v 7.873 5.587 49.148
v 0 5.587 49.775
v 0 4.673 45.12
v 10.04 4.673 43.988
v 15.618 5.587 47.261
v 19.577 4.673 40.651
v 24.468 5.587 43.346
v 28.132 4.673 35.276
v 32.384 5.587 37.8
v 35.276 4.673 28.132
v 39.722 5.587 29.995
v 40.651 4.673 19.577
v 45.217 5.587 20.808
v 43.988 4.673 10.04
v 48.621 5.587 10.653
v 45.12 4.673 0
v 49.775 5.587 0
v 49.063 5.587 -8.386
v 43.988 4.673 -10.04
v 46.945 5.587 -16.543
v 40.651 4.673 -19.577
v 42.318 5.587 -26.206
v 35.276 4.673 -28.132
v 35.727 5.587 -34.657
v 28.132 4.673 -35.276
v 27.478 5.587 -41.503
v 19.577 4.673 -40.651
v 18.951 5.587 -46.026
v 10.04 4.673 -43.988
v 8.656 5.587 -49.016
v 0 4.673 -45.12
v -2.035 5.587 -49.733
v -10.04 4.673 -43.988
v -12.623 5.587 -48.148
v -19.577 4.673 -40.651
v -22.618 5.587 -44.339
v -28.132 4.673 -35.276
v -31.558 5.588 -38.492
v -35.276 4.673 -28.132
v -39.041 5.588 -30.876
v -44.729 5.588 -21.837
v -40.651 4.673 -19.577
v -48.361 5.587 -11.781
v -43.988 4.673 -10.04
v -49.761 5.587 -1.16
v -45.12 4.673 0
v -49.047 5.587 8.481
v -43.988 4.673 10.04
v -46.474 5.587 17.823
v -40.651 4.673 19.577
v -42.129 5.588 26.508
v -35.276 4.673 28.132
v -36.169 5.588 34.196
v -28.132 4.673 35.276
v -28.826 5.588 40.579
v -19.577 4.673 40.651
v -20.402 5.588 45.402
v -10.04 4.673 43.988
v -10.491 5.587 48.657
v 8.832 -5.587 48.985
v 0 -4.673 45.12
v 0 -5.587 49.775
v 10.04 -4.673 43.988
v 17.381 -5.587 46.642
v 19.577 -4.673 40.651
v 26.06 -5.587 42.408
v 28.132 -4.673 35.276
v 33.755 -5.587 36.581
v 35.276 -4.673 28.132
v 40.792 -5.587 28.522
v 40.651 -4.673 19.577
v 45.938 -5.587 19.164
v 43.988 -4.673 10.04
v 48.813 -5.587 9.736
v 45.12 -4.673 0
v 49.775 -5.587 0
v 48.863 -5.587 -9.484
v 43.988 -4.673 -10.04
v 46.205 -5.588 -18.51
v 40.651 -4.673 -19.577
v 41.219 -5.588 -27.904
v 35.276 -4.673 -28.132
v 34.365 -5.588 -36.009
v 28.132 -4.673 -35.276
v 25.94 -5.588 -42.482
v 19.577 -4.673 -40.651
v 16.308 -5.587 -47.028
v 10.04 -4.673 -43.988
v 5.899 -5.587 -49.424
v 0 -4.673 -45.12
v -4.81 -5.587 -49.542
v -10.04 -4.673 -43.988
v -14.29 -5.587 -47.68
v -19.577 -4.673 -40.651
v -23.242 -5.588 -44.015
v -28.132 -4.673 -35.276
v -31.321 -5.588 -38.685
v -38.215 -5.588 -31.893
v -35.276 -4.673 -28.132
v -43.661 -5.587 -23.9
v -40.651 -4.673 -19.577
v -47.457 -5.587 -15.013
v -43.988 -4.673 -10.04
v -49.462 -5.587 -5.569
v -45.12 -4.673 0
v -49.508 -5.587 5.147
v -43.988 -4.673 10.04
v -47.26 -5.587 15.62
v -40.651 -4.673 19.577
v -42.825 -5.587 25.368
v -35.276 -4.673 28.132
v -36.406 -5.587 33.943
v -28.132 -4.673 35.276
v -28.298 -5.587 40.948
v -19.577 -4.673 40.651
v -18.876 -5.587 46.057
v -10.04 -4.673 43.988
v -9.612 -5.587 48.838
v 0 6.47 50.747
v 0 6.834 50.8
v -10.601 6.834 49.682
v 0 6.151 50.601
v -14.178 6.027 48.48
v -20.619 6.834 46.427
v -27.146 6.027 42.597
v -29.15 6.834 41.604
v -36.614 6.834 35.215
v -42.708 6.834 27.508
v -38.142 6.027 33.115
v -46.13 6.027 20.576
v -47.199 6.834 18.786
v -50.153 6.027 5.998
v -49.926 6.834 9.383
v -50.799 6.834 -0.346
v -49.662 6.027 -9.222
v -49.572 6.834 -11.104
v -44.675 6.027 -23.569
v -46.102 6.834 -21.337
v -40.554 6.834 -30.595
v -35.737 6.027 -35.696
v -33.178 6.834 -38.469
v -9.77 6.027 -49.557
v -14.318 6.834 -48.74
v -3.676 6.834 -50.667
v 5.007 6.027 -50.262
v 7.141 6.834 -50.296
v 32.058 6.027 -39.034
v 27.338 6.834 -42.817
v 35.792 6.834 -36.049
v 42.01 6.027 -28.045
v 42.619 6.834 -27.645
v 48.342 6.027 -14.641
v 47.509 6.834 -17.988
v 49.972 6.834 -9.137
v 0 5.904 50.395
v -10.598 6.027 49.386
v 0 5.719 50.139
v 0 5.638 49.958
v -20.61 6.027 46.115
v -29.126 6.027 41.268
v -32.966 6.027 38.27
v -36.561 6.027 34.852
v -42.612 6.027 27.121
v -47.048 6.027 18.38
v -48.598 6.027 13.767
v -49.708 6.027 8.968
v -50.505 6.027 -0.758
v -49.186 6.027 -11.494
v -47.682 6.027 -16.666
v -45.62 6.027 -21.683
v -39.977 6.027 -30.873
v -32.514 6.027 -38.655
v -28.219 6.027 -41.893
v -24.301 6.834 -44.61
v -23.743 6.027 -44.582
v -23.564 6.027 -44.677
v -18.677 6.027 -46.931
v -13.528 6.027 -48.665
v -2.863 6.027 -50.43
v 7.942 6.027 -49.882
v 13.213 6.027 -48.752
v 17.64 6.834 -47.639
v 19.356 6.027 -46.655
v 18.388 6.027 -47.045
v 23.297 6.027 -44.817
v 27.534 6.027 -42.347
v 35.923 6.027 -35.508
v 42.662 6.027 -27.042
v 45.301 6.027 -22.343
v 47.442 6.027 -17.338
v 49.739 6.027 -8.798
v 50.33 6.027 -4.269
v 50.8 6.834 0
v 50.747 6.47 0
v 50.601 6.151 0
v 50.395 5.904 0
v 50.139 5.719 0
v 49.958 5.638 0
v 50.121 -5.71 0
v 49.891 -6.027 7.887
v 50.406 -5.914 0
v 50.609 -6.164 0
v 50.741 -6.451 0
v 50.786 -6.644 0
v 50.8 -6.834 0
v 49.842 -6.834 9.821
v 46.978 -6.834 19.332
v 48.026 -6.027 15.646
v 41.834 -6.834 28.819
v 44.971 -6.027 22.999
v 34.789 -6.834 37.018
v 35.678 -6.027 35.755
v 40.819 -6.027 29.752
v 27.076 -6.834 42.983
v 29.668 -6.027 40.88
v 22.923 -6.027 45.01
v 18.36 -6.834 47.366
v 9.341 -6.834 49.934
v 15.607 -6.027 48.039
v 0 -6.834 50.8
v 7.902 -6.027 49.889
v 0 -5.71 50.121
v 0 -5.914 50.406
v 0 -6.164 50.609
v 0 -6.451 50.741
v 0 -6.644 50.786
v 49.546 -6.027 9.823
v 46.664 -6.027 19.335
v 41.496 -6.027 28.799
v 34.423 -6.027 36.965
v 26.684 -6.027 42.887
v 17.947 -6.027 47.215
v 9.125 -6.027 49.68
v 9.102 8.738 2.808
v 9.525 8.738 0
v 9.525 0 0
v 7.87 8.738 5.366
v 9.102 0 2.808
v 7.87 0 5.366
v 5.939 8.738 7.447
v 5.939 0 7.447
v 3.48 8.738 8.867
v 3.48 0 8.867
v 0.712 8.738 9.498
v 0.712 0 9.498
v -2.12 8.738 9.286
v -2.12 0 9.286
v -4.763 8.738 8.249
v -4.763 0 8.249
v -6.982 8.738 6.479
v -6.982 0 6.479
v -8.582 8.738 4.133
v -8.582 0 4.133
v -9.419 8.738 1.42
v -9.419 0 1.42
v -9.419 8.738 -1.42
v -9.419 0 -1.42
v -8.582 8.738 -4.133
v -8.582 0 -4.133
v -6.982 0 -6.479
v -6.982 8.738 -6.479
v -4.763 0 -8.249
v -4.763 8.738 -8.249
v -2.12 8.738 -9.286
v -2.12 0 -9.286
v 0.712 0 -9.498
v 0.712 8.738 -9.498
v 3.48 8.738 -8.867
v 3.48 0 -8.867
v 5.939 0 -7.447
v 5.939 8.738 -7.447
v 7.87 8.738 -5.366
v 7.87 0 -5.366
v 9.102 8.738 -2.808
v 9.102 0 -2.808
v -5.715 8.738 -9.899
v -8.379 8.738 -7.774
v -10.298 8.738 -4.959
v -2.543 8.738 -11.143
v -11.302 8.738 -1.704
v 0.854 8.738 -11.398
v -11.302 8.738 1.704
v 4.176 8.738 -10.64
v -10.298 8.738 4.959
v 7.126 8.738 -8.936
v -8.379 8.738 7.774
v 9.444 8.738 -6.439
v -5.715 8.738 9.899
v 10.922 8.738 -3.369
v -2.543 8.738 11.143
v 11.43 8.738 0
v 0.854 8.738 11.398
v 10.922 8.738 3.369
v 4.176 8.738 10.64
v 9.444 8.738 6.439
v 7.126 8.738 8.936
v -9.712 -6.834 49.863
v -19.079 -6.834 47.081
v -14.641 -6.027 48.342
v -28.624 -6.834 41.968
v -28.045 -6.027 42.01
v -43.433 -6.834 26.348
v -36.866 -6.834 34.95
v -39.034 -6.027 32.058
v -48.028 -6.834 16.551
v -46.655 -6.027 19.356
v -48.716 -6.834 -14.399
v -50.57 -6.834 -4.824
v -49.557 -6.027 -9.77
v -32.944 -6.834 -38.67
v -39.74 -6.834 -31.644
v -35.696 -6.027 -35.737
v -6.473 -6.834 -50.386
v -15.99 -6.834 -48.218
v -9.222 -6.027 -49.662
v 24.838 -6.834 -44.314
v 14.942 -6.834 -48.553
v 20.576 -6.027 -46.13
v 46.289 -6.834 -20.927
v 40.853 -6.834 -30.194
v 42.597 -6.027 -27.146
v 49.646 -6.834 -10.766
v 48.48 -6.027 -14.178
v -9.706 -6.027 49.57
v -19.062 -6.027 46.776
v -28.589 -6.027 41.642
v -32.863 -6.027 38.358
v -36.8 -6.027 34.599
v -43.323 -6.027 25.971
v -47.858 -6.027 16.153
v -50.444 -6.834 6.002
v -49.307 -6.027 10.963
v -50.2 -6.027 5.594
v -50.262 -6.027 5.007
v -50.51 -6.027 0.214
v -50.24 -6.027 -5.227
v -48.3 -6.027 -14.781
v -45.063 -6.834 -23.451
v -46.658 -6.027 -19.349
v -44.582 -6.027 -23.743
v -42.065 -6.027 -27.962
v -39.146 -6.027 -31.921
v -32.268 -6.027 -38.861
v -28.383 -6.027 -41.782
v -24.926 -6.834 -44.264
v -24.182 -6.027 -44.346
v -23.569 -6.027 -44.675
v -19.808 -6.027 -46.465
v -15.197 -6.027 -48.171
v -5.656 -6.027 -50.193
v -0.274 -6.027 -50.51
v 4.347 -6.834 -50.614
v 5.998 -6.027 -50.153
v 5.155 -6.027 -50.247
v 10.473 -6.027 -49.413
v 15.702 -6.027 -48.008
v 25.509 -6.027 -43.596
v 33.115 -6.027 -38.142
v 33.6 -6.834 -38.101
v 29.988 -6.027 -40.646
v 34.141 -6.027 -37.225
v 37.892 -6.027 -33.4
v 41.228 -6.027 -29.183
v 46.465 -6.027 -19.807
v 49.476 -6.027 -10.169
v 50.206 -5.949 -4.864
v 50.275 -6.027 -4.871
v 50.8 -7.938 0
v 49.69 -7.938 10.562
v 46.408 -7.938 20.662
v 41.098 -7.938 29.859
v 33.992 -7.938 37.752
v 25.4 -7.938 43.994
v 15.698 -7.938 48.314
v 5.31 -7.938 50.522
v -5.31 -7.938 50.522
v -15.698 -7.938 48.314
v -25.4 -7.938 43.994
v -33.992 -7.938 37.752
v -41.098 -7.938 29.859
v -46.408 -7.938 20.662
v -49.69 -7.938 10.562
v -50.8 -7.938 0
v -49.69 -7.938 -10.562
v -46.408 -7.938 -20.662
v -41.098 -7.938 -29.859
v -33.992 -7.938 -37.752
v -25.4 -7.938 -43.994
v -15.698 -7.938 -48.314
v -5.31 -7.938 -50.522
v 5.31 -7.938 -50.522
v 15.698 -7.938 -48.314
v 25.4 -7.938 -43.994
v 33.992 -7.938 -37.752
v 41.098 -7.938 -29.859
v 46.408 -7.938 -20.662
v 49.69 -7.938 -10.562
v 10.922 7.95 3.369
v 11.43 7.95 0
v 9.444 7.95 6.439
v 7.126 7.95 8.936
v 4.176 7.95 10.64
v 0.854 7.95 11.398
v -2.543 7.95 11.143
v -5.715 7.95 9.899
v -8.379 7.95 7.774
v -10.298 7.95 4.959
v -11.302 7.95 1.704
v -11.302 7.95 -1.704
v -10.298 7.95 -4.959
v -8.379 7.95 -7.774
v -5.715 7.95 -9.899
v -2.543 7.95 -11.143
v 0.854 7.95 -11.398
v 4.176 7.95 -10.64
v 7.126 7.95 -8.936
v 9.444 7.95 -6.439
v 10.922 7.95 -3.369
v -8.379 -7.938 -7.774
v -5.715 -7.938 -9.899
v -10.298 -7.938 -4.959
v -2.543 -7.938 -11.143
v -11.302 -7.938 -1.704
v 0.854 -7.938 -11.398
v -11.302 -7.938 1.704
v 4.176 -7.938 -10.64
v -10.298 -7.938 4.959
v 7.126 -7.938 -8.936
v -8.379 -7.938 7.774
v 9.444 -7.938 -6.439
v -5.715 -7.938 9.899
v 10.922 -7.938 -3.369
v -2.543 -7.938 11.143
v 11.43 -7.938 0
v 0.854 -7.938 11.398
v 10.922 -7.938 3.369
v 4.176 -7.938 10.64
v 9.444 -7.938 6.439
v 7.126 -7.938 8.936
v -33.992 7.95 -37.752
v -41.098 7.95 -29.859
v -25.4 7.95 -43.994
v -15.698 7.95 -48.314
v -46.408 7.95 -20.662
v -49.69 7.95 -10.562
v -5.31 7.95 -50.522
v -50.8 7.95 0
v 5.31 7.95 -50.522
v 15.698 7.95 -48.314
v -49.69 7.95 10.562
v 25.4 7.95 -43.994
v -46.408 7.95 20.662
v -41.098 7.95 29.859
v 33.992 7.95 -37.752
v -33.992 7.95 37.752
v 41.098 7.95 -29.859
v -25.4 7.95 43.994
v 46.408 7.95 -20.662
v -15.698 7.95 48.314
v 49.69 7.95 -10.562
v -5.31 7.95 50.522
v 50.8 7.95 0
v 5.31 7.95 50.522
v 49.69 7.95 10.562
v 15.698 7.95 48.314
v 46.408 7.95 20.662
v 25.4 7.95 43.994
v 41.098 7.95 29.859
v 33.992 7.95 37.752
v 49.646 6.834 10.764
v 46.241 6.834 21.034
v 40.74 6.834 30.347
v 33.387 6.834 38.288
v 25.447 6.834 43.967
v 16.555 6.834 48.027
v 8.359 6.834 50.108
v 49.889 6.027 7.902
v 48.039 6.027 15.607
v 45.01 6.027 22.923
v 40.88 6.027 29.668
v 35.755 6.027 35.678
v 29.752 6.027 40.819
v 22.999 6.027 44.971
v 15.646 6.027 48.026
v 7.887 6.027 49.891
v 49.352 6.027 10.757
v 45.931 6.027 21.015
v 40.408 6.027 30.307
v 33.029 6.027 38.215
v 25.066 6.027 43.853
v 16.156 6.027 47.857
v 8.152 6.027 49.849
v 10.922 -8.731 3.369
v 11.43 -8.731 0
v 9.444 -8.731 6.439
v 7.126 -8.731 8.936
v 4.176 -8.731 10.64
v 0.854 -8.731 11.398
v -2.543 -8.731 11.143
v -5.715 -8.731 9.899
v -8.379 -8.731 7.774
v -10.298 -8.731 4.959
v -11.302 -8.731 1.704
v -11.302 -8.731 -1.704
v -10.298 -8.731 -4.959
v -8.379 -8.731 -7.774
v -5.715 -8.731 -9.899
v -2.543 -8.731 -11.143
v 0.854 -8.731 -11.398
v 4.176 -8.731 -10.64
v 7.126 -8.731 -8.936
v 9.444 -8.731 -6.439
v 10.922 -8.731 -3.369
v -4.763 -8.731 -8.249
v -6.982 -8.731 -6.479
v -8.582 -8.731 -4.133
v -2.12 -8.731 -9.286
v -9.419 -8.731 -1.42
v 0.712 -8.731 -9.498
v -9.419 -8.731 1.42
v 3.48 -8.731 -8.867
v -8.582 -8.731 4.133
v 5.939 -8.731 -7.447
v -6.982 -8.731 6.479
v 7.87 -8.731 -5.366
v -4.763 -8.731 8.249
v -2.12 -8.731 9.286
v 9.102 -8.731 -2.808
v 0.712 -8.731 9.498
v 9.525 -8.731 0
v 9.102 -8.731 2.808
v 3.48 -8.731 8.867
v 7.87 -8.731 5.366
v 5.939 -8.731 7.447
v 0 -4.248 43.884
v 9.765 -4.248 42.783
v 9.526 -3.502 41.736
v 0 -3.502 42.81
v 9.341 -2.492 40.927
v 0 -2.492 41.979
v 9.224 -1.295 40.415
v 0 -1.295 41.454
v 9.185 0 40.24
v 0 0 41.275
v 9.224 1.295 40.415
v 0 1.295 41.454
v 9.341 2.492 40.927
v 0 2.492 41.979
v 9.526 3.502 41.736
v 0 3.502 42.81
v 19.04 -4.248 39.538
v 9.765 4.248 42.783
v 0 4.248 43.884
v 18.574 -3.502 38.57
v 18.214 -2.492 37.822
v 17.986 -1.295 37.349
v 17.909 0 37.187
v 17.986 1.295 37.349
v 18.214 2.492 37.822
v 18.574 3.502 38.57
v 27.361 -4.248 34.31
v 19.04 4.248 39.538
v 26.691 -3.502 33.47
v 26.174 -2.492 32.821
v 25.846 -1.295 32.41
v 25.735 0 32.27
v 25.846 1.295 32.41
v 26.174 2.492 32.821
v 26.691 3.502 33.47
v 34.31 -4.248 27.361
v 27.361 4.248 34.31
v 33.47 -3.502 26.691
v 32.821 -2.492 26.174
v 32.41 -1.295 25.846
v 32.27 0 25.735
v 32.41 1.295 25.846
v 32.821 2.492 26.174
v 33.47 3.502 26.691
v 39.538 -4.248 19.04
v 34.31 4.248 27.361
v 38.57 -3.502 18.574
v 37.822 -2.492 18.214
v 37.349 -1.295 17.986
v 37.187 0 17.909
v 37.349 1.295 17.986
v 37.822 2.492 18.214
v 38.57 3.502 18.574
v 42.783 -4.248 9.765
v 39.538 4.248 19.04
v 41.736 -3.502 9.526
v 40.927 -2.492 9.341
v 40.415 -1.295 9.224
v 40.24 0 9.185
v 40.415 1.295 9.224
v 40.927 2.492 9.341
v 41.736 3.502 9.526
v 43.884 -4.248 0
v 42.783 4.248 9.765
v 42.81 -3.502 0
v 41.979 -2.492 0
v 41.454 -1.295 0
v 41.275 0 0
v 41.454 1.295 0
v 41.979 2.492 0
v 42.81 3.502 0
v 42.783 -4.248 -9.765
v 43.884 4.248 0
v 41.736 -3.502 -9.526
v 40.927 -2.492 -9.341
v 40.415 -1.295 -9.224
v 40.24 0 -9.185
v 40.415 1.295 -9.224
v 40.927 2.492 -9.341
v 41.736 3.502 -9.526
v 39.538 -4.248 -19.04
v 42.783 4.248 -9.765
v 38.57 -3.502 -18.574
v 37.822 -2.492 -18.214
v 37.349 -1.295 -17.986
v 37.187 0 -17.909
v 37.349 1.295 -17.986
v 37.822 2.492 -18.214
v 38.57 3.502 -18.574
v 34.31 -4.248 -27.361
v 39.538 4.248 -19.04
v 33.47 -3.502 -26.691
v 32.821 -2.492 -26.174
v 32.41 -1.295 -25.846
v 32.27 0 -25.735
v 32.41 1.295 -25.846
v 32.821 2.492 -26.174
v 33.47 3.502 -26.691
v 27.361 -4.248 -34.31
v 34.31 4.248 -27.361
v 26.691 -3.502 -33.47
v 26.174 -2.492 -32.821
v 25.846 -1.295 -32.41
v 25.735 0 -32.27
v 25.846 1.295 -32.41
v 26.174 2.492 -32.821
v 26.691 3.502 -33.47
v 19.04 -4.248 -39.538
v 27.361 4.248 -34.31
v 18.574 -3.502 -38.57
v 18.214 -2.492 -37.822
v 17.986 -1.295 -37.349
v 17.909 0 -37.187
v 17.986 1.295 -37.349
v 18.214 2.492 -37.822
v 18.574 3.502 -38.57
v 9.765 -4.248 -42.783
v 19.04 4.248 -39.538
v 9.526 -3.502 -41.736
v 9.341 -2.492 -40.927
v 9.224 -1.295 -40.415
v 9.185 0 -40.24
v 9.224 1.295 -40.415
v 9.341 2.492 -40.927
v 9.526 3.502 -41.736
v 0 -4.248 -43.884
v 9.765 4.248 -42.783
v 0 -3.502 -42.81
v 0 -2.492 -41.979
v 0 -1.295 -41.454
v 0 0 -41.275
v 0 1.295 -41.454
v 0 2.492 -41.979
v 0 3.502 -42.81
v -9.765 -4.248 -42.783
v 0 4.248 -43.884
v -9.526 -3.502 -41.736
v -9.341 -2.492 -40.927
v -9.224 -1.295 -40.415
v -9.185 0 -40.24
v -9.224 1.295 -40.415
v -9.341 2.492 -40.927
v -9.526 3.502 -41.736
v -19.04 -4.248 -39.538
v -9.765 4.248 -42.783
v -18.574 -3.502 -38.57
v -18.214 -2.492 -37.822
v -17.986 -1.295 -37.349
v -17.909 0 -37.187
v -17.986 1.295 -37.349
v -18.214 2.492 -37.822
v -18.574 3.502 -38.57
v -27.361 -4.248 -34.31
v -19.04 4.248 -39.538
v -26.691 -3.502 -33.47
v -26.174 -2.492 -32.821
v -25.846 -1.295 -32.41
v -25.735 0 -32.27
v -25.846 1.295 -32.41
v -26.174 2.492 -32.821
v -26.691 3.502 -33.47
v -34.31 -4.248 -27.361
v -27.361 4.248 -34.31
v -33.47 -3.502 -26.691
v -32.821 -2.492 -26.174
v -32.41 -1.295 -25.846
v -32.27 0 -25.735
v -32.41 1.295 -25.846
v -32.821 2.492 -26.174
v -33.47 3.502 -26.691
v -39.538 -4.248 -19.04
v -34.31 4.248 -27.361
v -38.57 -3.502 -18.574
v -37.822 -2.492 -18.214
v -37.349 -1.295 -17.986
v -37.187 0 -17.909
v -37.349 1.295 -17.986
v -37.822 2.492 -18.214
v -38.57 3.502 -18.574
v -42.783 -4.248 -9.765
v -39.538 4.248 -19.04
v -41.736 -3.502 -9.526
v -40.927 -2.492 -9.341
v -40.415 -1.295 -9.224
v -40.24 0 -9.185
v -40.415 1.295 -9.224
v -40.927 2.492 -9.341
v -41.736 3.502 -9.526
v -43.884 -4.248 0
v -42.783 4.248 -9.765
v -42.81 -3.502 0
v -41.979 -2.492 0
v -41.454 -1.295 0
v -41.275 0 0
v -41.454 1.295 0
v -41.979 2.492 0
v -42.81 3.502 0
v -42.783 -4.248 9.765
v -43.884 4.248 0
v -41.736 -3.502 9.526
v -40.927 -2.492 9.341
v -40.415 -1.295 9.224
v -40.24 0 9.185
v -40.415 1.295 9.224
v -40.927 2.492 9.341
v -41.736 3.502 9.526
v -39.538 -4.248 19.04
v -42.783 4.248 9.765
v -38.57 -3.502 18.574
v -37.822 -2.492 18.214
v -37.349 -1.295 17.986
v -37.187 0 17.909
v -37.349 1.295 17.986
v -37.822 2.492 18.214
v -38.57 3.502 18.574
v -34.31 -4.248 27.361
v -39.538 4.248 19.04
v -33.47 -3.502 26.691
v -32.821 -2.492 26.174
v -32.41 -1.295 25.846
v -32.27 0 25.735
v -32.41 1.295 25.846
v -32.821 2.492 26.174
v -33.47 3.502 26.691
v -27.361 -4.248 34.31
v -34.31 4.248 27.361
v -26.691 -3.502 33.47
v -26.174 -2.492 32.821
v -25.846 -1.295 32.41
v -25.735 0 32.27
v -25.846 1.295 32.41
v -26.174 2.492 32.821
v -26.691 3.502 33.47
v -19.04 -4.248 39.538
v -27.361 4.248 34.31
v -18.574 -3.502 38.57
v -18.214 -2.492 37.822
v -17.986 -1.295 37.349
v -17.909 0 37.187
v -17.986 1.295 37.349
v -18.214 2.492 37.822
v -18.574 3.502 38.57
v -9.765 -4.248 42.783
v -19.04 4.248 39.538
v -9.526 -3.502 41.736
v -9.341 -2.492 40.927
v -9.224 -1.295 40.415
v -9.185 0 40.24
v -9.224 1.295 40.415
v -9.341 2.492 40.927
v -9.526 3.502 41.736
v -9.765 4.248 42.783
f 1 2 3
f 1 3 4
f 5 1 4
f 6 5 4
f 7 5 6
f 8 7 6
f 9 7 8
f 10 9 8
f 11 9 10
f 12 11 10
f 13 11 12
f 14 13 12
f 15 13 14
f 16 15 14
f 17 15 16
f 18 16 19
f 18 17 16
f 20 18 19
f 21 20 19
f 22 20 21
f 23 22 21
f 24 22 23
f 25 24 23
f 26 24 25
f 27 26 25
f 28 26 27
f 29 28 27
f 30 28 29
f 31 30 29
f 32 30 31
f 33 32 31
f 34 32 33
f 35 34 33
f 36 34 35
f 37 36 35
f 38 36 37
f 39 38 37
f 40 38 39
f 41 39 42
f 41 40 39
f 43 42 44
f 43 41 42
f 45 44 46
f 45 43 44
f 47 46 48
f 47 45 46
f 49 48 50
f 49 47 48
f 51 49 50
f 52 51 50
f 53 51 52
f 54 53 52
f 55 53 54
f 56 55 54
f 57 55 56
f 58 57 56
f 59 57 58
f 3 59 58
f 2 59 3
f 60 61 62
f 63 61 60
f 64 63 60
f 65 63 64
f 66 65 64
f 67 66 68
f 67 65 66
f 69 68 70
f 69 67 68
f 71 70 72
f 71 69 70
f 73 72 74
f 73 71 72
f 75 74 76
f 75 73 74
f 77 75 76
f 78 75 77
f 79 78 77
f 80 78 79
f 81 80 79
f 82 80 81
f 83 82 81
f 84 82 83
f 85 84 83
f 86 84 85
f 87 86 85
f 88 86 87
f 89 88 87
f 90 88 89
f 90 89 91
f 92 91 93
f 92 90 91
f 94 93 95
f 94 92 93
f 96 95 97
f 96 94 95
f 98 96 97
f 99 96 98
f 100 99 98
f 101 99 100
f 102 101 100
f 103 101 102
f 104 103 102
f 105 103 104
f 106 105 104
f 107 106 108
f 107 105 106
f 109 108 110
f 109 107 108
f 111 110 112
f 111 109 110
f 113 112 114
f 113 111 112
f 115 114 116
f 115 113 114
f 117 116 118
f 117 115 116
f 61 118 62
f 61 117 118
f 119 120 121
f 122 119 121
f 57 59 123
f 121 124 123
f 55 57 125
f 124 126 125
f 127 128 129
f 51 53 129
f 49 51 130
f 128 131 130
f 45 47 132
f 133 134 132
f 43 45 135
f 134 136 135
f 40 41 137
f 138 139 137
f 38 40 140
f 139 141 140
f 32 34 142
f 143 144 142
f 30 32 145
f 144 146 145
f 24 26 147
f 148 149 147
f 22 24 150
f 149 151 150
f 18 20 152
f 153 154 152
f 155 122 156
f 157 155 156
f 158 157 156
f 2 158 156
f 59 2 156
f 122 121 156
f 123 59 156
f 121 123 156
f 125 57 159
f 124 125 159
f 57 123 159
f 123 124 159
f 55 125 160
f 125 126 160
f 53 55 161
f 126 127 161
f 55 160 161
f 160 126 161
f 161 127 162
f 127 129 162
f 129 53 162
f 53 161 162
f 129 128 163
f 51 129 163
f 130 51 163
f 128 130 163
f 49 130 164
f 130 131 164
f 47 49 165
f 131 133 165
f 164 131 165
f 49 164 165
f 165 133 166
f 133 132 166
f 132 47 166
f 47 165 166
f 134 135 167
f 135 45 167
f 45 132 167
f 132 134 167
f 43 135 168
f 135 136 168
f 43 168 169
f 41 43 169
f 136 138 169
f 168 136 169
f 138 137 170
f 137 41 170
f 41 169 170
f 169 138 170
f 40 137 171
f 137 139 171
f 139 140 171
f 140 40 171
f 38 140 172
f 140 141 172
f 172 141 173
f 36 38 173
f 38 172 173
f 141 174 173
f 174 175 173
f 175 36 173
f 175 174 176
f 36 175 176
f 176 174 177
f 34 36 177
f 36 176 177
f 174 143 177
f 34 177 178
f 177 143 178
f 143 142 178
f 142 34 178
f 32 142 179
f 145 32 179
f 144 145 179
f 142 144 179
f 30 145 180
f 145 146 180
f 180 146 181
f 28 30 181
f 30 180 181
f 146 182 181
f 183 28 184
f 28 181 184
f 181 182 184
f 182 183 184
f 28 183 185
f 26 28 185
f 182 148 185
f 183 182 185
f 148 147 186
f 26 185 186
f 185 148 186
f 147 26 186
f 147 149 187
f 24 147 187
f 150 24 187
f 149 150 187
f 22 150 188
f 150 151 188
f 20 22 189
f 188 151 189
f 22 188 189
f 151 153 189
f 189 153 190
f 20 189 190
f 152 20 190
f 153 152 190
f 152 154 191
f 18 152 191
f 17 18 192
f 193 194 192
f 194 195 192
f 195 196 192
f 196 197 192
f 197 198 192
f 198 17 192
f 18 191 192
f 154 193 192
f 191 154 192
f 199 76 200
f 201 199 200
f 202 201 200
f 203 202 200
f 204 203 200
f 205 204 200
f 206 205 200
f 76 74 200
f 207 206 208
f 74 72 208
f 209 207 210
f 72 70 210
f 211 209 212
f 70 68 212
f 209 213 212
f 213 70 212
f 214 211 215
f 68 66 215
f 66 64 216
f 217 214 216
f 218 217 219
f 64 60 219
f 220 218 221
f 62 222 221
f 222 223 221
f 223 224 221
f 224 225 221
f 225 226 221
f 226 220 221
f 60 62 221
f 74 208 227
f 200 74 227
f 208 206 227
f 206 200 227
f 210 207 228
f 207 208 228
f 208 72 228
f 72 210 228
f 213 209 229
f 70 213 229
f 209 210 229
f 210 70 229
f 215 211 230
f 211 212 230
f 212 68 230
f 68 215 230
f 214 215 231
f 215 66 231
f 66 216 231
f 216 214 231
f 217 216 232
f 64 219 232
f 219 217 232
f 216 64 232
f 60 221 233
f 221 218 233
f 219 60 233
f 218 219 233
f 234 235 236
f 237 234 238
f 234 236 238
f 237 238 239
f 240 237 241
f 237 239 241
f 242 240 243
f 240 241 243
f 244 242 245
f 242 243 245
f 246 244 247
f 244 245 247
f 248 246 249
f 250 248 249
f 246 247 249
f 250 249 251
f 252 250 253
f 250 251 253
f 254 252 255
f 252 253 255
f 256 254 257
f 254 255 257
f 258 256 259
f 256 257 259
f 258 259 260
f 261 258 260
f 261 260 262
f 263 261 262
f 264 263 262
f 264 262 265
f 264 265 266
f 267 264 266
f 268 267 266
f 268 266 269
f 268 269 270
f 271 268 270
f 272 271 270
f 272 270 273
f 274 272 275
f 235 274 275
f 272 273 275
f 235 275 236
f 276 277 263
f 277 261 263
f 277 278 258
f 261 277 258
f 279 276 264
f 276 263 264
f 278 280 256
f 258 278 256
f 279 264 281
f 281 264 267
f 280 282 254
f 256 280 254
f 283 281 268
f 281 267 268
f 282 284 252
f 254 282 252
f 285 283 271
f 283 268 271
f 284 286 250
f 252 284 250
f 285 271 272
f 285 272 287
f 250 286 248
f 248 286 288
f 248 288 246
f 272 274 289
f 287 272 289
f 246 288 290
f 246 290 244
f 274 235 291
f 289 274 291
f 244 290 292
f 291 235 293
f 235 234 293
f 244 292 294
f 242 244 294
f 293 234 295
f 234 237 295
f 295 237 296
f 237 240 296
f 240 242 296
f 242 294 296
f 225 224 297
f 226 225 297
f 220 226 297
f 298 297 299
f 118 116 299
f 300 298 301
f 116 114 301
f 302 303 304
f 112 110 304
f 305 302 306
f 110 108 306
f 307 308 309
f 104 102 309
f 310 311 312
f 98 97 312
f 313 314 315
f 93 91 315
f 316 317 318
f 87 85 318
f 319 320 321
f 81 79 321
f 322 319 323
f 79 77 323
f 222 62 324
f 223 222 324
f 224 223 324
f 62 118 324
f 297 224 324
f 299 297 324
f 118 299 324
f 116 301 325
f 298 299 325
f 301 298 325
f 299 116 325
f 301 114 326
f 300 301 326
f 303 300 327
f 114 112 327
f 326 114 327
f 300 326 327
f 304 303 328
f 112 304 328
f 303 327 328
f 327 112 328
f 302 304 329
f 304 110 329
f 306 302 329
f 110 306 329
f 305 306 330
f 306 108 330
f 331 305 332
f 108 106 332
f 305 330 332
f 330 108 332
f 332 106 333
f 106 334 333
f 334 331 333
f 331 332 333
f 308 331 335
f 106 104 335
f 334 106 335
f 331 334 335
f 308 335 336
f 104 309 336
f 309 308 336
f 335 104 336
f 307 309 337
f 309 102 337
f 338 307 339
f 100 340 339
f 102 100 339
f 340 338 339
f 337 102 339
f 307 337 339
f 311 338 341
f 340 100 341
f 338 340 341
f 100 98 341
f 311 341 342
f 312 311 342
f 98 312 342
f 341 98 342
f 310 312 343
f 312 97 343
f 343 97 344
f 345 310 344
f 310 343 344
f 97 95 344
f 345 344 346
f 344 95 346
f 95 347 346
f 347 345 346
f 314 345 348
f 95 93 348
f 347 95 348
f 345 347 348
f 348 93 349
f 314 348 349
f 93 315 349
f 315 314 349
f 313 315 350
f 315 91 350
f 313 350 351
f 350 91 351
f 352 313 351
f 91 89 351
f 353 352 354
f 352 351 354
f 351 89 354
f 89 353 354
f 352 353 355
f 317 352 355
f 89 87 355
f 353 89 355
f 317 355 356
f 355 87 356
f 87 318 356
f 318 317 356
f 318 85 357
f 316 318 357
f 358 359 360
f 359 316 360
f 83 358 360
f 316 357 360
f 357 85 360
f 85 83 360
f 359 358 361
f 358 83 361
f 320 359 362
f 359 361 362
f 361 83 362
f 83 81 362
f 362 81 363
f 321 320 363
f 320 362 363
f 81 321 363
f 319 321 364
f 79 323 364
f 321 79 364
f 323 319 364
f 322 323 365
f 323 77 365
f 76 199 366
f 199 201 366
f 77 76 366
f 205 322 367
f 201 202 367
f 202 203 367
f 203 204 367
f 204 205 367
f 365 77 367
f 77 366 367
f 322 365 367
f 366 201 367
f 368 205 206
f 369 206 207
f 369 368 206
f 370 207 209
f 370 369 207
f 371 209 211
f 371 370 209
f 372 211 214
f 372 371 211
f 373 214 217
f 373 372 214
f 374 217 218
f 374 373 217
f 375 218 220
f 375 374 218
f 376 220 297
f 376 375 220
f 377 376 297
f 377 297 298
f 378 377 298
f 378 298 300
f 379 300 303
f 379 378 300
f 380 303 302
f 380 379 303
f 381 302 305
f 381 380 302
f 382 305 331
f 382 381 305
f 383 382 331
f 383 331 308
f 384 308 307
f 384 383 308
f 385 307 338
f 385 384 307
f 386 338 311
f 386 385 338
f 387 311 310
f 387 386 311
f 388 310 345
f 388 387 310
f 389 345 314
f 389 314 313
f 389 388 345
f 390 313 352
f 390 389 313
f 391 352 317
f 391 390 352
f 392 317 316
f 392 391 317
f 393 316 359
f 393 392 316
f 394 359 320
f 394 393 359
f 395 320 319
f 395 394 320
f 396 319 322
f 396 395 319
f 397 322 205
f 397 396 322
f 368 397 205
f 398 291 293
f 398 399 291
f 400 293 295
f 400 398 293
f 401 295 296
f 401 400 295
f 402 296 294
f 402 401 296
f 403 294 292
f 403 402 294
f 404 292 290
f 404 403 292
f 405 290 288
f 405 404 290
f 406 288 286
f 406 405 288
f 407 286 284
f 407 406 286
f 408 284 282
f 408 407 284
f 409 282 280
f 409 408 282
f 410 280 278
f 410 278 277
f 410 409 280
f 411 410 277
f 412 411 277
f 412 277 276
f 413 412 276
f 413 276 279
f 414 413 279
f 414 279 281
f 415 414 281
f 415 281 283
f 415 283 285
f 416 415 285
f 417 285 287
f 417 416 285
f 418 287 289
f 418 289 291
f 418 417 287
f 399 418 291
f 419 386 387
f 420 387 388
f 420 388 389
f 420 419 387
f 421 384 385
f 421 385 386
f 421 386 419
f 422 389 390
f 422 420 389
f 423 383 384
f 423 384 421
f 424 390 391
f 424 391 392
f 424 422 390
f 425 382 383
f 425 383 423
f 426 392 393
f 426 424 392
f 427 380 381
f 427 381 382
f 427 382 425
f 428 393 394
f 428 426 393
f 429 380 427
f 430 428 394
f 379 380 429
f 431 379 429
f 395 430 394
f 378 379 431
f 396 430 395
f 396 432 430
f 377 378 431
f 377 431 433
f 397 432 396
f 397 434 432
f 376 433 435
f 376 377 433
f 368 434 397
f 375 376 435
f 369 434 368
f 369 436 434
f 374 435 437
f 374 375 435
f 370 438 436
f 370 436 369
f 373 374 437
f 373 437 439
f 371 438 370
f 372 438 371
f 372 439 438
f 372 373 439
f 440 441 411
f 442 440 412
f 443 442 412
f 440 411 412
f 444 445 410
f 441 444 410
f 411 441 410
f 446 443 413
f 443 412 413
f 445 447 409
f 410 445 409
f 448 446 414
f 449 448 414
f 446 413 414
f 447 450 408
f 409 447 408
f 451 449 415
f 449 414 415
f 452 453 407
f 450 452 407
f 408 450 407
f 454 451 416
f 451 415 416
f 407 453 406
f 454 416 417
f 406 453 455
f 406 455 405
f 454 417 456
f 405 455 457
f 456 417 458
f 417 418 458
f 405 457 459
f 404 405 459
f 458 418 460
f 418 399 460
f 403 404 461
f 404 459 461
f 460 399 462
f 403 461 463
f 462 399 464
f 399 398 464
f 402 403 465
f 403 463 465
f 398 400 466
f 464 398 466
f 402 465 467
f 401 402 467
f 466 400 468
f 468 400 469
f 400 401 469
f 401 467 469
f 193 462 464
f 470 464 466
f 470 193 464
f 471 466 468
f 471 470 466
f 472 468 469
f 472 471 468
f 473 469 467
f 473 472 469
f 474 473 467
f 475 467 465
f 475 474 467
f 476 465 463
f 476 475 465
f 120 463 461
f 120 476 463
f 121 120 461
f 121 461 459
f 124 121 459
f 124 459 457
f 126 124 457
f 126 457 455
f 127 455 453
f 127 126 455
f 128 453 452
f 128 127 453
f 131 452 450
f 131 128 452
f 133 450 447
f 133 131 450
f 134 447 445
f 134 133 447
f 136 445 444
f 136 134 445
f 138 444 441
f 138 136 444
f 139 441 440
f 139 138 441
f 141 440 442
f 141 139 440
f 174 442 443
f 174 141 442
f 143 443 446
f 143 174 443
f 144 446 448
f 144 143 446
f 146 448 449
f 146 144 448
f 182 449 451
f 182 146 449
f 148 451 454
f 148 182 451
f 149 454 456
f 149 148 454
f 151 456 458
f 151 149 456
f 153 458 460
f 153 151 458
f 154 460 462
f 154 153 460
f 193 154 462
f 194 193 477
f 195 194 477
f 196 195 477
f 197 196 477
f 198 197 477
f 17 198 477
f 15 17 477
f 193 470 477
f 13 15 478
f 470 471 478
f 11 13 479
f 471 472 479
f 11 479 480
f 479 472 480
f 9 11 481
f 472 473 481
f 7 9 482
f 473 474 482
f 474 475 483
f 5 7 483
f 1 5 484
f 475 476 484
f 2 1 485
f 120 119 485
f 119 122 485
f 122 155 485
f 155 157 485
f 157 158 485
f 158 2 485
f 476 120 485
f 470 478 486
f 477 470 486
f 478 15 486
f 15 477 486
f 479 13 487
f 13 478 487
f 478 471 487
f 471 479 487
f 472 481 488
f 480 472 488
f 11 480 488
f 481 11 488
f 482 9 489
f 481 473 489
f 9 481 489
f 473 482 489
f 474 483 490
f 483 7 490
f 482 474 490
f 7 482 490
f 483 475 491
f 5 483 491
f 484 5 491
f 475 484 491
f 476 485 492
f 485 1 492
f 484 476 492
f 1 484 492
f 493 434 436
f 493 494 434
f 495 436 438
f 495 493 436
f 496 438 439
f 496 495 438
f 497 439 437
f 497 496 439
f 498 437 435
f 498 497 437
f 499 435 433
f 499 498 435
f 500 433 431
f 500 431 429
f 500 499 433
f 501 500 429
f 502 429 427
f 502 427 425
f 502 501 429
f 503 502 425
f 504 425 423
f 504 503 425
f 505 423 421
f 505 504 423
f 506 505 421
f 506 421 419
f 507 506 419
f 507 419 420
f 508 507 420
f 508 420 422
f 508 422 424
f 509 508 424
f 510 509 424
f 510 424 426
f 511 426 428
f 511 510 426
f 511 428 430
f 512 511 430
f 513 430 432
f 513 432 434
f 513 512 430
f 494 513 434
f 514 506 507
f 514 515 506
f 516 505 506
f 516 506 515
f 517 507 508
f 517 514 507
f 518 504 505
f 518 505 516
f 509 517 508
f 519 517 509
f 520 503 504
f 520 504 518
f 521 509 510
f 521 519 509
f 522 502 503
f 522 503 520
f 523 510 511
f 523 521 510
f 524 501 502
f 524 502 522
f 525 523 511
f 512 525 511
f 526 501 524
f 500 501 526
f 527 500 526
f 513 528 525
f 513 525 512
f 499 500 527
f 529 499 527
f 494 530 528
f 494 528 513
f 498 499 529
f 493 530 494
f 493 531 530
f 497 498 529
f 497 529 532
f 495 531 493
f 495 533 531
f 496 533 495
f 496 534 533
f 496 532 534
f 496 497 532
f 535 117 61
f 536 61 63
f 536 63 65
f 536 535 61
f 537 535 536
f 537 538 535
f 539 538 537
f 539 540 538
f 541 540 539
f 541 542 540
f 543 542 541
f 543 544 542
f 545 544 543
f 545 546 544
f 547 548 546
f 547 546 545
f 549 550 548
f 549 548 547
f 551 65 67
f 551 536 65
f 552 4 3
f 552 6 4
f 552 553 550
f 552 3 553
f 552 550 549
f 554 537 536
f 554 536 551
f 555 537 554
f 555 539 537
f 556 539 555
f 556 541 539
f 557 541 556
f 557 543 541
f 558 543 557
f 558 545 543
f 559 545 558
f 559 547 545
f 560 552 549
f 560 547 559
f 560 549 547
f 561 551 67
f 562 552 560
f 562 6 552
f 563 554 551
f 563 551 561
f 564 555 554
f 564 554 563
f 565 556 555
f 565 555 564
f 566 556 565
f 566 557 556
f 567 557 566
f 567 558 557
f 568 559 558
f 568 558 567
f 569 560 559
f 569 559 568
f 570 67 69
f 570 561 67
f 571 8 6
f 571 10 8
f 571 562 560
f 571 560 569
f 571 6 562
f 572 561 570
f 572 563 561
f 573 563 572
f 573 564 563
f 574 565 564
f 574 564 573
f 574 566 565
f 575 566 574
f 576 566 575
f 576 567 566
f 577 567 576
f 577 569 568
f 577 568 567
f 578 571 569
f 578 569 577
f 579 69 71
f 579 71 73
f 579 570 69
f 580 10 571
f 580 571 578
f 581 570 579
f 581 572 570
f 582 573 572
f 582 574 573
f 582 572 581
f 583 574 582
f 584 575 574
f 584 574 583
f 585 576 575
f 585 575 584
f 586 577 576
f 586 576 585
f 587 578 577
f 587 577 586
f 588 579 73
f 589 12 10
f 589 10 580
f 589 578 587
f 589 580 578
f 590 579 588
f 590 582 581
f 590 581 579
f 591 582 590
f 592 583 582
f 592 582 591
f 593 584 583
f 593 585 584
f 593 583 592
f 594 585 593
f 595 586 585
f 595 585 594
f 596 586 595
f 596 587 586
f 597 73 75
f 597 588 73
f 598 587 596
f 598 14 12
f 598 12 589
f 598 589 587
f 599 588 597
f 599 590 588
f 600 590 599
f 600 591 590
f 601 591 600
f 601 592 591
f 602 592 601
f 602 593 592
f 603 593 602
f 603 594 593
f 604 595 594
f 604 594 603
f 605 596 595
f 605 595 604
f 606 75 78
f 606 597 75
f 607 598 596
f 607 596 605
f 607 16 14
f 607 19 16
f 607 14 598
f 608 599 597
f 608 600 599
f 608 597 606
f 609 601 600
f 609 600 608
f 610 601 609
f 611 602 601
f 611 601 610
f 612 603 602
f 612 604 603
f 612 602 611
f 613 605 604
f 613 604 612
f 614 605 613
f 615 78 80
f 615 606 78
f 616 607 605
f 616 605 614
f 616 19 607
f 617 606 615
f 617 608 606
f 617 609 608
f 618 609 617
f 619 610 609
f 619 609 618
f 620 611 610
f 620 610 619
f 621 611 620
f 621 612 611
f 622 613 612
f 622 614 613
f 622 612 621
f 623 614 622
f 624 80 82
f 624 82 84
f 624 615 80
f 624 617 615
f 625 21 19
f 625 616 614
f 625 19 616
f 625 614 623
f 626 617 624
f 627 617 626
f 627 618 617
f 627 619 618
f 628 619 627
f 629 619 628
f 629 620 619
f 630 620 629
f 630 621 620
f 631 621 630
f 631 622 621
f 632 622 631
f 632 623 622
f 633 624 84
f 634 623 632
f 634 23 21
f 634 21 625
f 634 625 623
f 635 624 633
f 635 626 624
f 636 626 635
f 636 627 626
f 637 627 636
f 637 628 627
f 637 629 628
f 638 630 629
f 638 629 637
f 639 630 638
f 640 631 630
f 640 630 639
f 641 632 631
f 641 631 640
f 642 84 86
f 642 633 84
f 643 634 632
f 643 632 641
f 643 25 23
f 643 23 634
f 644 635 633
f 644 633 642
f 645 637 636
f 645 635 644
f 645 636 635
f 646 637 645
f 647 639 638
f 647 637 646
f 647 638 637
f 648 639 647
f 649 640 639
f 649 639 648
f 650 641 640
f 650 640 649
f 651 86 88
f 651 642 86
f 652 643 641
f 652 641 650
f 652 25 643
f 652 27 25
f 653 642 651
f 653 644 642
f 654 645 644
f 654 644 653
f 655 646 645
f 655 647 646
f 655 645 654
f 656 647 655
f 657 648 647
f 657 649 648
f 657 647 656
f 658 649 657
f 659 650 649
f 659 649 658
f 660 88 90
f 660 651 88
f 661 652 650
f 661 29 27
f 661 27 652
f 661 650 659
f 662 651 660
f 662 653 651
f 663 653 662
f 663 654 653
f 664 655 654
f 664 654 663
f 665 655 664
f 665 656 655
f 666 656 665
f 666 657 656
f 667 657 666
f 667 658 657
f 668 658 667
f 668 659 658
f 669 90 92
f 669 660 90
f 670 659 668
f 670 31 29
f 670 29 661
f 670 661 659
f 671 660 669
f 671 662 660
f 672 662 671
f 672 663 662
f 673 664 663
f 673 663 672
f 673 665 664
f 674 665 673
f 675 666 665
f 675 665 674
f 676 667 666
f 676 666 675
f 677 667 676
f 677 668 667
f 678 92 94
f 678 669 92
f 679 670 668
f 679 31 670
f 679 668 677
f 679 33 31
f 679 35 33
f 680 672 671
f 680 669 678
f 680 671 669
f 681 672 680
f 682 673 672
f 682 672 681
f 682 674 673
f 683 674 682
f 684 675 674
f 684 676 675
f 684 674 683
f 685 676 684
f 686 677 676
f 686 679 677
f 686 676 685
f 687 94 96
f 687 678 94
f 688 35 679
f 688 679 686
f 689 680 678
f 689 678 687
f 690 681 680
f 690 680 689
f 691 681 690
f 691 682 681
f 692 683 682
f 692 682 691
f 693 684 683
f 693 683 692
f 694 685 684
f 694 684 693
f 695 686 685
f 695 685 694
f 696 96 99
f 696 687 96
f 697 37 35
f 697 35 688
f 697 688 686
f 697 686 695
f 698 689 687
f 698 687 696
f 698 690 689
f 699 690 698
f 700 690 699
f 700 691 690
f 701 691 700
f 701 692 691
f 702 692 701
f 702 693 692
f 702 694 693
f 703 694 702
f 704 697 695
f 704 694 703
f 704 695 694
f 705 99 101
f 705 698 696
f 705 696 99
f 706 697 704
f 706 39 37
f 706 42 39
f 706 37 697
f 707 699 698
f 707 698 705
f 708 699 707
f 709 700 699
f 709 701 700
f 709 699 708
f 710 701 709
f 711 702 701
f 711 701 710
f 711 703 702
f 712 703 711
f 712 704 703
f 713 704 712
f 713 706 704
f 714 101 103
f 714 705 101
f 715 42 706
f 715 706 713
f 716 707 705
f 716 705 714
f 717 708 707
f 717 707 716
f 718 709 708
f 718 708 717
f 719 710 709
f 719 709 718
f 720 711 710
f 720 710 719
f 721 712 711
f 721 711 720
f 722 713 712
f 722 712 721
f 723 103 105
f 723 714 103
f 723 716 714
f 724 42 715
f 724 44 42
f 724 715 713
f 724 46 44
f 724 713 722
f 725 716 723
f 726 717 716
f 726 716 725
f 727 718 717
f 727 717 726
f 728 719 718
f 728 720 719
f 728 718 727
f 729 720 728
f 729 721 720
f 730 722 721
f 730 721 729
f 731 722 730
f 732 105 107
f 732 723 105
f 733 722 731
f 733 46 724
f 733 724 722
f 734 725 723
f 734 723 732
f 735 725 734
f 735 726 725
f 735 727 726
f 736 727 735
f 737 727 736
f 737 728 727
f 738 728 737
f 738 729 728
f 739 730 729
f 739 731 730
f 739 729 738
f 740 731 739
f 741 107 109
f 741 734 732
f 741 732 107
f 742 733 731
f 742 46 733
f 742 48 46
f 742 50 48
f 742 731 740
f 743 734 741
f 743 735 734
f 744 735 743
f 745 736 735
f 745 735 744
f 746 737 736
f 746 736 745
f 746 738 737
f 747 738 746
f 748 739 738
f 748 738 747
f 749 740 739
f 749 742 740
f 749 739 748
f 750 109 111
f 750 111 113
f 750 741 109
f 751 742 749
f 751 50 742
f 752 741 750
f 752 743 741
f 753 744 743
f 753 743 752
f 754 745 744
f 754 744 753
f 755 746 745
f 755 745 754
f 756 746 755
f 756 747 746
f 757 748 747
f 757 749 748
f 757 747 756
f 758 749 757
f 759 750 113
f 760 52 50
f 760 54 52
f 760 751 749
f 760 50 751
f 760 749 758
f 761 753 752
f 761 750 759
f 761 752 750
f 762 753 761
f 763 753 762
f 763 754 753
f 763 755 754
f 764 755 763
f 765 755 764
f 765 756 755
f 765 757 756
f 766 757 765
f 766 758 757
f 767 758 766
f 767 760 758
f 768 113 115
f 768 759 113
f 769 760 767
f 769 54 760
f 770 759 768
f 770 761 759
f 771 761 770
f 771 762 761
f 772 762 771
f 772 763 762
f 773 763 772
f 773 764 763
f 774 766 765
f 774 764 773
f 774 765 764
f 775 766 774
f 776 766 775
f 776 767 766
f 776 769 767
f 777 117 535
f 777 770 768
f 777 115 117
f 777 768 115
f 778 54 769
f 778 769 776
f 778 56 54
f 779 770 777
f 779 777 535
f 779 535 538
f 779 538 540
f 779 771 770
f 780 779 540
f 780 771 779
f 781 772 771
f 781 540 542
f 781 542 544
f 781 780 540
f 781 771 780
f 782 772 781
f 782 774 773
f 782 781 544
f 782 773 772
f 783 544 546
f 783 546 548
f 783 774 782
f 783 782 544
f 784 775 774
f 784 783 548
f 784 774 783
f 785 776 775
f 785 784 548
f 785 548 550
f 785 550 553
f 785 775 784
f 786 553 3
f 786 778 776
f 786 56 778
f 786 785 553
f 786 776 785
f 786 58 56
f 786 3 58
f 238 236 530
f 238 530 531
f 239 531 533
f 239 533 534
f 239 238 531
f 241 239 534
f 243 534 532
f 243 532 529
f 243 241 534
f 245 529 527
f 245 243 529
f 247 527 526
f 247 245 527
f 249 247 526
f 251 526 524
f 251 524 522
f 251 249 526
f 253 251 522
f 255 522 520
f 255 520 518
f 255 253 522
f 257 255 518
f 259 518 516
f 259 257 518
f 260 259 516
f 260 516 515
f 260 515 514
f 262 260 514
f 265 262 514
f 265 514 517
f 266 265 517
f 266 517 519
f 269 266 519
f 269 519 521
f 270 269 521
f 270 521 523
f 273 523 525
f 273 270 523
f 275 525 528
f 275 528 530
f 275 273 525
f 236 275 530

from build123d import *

# Parameters (mm, degrees)
F0_R          = 11.43
F0_R_2        = 9.525
F1_DEPTH      = 8.73125
F1_DEPTH_BACK = 8.7376
F0_R_3        = 50.8
F2_DEPTH      = 7.9375
F2_DEPTH_BACK = 7.9502
F5_R          = 1.27


with BuildPart() as f1:
    # F0 (on Front) → F1 (new body, two sides)
    with BuildSketch(Plane.XZ) as f1_sk:
        Circle(F0_R)
        Circle(F0_R_2, mode=Mode.SUBTRACT)
    extrude(amount=F1_DEPTH)
    extrude(f1_sk.sketch, amount=-F1_DEPTH_BACK)

    # F0 (on Front) → F2 (join, two sides)
    with BuildSketch(Plane.XZ) as f2_sk:
        Circle(F0_R_3)
        Circle(F0_R, mode=Mode.SUBTRACT)
    extrude(amount=F2_DEPTH)
    extrude(f2_sk.sketch, amount=-F2_DEPTH_BACK)

    # F3 (on Right) → F4 (revolve, cut)
    with BuildSketch(Plane.YZ):
        with BuildLine():
            Line((-6.35, 53.6575), (-4.6732280163, 45.1197058197))
            ThreePointArc((-4.6732280163, 45.1197058197), (0, 41.275), (4.6732280163, 45.1197058197))
            Line((4.6732280163, 45.1197058197), (6.35, 53.6575))
            Line((6.35, 53.6575), (0, 53.6575))
            Line((0, 53.6575), (-6.35, 53.6575))
        make_face()
    revolve(axis=Axis((0, 33.8884852827, 0), (0, 1, 0)), mode=Mode.SUBTRACT)

    # F5
    f5_edges = [f1.edges().sort_by_distance(p)[0] for p in [
        (35.921024, 5.788804, 35.921024),
        (-35.921024, 5.788804, -35.921024),
        (-35.921024, -5.788804, -35.921024),
        (35.921024, -5.788804, 35.921024),
    ]]
    fillet(f5_edges, radius=F5_R)


solid = f1.part
